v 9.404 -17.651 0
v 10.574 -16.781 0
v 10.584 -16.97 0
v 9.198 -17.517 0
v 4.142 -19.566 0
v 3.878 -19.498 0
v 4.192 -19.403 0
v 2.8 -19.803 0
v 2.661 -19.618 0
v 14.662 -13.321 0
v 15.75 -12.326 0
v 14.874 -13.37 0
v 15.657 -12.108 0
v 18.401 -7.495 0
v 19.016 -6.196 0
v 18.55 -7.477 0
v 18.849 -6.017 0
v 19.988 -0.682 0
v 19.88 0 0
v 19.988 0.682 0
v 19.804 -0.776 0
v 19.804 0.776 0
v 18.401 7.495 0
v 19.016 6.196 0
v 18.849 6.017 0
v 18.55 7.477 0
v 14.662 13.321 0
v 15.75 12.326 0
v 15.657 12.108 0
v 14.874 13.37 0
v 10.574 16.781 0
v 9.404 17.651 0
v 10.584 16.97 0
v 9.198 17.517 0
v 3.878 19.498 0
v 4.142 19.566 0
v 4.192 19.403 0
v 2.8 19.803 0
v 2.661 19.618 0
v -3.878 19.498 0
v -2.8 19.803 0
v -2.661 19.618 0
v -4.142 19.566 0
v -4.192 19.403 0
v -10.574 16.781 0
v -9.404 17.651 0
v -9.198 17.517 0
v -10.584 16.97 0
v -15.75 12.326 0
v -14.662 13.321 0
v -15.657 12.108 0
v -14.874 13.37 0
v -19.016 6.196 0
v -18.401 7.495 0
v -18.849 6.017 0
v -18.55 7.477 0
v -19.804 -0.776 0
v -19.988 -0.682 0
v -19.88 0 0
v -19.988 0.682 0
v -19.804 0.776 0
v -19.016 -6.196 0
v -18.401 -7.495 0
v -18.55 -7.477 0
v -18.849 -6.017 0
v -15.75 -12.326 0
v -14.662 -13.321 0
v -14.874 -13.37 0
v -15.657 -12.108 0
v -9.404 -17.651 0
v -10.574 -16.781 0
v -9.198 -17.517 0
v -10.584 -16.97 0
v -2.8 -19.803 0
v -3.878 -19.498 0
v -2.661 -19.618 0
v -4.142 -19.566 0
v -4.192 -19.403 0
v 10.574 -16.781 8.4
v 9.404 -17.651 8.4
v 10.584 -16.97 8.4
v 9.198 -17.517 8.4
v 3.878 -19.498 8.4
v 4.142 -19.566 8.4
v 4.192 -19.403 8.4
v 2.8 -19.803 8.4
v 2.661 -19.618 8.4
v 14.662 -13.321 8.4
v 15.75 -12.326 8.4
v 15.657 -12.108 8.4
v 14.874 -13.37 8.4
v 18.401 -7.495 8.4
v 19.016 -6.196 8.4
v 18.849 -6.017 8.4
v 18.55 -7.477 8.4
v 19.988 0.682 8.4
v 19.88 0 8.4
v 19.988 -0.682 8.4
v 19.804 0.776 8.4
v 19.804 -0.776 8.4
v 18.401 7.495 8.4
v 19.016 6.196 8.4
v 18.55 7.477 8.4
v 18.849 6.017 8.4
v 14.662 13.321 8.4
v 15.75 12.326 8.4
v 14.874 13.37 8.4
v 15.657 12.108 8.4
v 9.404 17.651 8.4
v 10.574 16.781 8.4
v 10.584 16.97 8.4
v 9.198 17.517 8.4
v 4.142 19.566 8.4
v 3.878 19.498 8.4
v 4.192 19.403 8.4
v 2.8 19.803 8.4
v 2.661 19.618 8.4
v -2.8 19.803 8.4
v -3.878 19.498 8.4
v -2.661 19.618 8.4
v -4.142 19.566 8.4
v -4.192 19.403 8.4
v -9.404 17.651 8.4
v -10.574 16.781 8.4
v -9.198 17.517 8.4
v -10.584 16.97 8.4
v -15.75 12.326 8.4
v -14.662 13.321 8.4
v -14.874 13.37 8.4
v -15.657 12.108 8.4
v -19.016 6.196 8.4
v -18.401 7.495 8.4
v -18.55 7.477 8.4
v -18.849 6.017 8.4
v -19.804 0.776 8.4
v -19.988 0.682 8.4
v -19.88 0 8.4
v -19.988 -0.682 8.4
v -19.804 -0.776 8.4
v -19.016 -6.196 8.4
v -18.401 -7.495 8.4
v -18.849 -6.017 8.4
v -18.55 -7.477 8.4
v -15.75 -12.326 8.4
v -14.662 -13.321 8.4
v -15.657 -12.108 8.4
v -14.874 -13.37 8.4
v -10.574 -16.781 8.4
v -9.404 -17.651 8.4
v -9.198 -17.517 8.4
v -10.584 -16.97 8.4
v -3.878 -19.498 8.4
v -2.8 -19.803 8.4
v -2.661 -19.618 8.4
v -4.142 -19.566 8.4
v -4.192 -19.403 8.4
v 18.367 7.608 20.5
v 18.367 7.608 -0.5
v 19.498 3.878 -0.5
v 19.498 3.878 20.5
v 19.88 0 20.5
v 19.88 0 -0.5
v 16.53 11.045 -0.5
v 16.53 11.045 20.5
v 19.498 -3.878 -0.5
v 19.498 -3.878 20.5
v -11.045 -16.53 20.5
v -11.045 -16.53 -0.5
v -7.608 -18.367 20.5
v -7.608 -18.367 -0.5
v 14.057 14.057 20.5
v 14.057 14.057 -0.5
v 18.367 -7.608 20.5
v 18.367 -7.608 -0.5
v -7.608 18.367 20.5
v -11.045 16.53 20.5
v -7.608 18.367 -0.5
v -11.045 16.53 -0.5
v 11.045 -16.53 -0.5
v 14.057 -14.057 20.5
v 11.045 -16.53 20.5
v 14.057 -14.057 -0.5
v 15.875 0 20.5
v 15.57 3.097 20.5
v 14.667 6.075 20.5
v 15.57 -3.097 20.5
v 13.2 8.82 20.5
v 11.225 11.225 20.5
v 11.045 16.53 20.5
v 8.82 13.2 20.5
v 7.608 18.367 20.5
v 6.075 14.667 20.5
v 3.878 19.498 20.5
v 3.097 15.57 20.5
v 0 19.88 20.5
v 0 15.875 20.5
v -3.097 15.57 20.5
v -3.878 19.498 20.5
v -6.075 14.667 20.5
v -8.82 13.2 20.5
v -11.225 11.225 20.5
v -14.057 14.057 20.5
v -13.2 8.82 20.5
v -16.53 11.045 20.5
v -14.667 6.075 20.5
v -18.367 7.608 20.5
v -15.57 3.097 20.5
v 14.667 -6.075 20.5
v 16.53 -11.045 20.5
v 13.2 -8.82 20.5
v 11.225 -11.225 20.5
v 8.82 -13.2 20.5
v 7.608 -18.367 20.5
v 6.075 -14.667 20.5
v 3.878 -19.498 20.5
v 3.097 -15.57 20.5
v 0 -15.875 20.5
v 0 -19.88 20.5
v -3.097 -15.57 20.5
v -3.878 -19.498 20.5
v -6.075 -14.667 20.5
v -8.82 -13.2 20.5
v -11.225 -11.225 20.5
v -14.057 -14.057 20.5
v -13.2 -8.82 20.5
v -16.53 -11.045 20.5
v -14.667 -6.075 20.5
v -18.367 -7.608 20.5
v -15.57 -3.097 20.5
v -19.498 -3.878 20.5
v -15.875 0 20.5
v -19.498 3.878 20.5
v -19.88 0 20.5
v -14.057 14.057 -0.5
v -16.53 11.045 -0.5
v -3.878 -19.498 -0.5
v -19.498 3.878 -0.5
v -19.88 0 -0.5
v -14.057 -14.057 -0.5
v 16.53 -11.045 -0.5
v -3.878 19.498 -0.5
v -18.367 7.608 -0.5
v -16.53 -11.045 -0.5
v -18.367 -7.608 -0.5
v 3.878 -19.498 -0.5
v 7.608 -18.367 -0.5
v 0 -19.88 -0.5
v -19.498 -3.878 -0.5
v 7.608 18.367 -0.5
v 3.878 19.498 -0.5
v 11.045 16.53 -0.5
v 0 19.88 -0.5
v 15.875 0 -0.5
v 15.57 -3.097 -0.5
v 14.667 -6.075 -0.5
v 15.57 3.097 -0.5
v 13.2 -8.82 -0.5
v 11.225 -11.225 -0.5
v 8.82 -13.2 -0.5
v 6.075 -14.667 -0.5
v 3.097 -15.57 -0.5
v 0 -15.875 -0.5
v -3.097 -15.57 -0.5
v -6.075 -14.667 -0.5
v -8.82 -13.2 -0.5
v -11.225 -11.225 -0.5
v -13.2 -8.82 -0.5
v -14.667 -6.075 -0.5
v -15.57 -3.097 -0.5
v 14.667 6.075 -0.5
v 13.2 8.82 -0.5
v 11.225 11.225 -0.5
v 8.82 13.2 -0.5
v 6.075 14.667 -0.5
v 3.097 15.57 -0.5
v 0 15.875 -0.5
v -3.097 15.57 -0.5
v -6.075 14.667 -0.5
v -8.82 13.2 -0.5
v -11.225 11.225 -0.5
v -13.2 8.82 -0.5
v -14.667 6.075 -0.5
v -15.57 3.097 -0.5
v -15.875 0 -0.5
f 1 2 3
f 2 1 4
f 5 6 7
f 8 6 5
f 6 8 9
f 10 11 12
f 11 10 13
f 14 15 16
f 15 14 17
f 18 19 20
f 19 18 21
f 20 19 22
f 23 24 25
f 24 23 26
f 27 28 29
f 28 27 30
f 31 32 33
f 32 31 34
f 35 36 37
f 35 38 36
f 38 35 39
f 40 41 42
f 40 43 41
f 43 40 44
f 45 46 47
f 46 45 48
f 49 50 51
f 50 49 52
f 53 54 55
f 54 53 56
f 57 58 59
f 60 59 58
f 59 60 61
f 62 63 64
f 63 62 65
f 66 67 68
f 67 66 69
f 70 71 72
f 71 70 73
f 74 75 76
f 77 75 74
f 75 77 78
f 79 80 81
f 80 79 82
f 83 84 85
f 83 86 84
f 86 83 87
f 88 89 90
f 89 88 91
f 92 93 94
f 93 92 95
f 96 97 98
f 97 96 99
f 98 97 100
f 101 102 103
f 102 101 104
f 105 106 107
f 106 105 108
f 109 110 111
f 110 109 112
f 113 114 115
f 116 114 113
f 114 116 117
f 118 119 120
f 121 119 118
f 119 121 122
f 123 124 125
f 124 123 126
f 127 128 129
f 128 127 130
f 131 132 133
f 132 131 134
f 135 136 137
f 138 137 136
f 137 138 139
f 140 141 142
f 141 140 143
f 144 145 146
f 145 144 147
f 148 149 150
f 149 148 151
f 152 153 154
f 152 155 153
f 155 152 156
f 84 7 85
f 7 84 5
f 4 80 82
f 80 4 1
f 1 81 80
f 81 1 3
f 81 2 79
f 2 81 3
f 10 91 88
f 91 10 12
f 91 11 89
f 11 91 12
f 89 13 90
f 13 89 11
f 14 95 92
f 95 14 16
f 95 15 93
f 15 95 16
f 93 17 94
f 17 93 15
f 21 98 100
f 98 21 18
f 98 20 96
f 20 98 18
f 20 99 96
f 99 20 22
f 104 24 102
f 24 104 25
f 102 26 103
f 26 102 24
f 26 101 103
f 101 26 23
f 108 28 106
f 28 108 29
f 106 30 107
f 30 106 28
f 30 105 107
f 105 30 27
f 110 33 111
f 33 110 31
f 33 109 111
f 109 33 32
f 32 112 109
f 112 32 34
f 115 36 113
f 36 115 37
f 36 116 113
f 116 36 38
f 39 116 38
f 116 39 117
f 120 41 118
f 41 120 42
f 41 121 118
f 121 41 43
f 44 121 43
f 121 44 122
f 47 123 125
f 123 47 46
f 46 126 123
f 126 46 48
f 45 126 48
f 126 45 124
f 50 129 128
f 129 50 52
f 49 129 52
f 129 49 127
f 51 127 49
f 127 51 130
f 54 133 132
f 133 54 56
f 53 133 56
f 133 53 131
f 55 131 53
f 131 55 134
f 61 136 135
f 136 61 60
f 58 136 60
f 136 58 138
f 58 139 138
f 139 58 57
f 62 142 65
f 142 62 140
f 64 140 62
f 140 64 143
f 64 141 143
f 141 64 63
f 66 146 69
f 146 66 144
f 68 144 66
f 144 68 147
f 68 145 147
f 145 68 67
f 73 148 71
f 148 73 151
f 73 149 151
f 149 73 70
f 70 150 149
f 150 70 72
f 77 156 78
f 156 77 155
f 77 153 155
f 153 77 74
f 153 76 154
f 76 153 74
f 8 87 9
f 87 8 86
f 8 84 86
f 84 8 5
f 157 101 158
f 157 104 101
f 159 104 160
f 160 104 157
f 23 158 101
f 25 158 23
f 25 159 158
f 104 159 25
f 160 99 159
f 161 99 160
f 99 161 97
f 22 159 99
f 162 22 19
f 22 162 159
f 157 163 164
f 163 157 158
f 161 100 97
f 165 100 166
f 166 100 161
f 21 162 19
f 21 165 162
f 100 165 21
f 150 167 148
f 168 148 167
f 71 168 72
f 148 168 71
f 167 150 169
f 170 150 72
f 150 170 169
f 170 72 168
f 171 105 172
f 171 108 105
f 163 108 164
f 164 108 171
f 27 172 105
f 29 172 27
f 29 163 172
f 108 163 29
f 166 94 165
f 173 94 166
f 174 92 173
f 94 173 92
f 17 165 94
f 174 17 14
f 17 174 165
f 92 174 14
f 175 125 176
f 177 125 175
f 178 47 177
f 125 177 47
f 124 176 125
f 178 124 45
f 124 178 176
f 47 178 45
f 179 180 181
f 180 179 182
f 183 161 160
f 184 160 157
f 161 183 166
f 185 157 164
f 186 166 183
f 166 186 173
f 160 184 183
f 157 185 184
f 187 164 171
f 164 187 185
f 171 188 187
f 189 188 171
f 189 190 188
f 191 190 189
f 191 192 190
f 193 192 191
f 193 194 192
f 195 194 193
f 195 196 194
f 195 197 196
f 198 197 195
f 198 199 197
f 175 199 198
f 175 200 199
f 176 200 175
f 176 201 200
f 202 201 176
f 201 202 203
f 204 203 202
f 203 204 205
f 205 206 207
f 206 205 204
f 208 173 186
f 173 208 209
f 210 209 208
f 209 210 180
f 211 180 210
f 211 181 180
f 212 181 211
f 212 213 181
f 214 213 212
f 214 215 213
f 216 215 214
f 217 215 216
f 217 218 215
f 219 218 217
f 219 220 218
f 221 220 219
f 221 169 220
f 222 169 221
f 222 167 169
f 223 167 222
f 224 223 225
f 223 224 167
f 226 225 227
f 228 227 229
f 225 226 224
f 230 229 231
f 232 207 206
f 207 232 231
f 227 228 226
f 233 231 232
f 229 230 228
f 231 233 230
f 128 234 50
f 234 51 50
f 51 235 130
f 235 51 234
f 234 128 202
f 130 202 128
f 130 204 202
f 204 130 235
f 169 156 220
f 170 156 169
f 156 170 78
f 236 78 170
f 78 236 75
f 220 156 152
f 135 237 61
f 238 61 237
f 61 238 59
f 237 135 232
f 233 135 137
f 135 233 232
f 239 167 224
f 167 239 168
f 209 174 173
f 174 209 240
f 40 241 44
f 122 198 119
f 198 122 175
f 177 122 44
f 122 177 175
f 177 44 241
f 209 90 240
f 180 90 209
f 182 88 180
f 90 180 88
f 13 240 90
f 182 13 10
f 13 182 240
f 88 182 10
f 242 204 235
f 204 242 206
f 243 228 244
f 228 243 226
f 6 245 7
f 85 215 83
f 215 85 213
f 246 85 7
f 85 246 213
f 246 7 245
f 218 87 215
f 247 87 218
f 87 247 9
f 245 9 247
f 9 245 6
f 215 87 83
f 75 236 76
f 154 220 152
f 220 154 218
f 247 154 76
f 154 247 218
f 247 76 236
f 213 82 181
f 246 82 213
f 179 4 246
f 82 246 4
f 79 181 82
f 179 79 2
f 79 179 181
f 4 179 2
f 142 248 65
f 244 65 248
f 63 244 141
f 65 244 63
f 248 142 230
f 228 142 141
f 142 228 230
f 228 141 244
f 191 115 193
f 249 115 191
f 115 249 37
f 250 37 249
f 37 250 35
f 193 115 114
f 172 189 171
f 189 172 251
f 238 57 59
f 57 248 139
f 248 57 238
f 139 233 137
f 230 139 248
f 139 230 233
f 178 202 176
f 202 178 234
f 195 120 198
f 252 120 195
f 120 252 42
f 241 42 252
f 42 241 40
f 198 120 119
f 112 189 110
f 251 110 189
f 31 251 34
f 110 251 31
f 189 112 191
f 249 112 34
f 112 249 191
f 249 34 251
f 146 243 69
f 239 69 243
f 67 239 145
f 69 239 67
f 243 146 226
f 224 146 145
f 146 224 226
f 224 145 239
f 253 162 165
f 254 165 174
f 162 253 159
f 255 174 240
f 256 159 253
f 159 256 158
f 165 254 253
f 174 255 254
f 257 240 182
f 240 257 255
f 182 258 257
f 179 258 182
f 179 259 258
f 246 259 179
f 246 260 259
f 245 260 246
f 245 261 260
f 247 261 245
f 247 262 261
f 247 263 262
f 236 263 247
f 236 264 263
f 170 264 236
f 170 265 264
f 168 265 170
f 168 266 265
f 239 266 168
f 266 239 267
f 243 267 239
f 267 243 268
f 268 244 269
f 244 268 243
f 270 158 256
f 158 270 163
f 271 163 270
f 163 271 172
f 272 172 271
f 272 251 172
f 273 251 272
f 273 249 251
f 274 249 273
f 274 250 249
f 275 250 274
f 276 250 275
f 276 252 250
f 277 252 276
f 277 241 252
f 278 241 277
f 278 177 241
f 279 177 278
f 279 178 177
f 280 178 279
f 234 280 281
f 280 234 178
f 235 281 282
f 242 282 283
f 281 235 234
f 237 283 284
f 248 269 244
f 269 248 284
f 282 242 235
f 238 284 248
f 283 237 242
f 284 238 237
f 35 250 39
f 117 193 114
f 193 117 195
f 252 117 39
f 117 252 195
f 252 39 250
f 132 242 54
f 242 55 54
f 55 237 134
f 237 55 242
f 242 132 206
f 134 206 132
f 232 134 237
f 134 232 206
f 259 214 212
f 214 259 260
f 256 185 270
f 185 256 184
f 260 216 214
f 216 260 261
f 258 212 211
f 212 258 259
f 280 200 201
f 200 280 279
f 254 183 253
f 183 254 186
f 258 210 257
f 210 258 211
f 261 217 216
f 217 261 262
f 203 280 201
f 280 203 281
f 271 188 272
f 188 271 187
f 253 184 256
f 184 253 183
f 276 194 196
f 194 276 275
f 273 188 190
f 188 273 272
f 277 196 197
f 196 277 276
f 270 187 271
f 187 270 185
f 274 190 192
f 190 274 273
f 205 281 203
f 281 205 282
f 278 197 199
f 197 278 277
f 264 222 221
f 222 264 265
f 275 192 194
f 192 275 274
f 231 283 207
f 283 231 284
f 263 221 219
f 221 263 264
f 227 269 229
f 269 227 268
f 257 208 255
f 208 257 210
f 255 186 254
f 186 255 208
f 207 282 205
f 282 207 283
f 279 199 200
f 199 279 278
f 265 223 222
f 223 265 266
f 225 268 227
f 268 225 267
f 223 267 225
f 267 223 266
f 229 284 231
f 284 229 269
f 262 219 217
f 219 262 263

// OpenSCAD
$fn = 32;

// ----------------------------------------------------------------------
// Two-module gear rim: z18 m2 and z18 m1.4, 20 mm wide
// ----------------------------------------------------------------------

// --- parameters (mm) ---
module_a = 2;             // first tooth module
teeth_a = 18;             // first band tooth count
module_b = 1.4;           // second tooth module
teeth_b = 18;             // second band tooth count
band_h = 8;               // height of one tooth band
web_t = 4;                // web thickness between the bands
total = 20;               // overall width over both bands
root_r = 15.5;            // root radius of the coarse band
hub_r = 19.88;            // hub radius
bore_d = 31.75;           // hub bore
hole_count = 6;           // lightening holes
hole_r = 10.75;           // lightening hole circle radius
hole_d = 4.28;            // lightening hole diameter

band_a = [[15.419, -1.579], [17.907, -1.575], [18.95, -1.21], [19.988, -0.682], [19.988, 0.682], [18.95, 1.21], [17.907, 1.575], [15.419, 1.579], [15.029, 3.79], [17.366, 4.644], [18.221, 5.344], [19.016, 6.196], [18.55, 7.477], [17.393, 7.618], [16.288, 7.605], [13.95, 6.757], [12.827, 8.702], [14.73, 10.304], [15.294, 11.254], [15.75, 12.326], [14.874, 13.37], [13.739, 13.107], [12.705, 12.717], [10.797, 11.121], [9.077, 12.564], [10.318, 14.72], [10.523, 15.806], [10.584, 16.97], [9.404, 17.651], [8.427, 17.016], [7.589, 16.296], [6.343, 14.143], [4.232, 14.911], [4.661, 17.362], [4.482, 18.452], [4.142, 19.566], [2.8, 19.803], [2.099, 18.872], [1.558, 17.909], [1.123, 15.459], [-1.123, 15.459], [-1.558, 17.909], [-2.099, 18.872], [-2.8, 19.803], [-4.142, 19.566], [-4.482, 18.452], [-4.661, 17.362], [-4.232, 14.911], [-6.343, 14.143], [-7.589, 16.296], [-8.427, 17.016], [-9.404, 17.651], [-10.584, 16.97], [-10.523, 15.806], [-10.318, 14.72], [-9.077, 12.564], [-10.797, 11.121], [-12.705, 12.717], [-13.739, 13.107], [-14.874, 13.37], [-15.75, 12.326], [-15.294, 11.254], [-14.73, 10.304], [-12.827, 8.702], [-13.95, 6.757], [-16.288, 7.605], [-17.393, 7.618], [-18.55, 7.477], [-19.016, 6.196], [-18.221, 5.344], [-17.366, 4.644], [-15.029, 3.79], [-15.419, 1.579], [-17.907, 1.575], [-18.95, 1.21], [-19.988, 0.682], [-19.988, -0.682], [-18.95, -1.21], [-17.907, -1.575], [-15.419, -1.579], [-15.029, -3.79], [-17.366, -4.644], [-18.221, -5.344], [-19.016, -6.196], [-18.55, -7.477], [-17.393, -7.618], [-16.288, -7.605], [-13.95, -6.757], [-12.827, -8.702], [-14.73, -10.304], [-15.294, -11.254], [-15.75, -12.326], [-14.874, -13.37], [-13.739, -13.107], [-12.705, -12.717], [-10.797, -11.121], [-9.077, -12.564], [-10.318, -14.72], [-10.523, -15.806], [-10.584, -16.97], [-9.404, -17.651], [-8.427, -17.016], [-7.589, -16.296], [-6.343, -14.143], [-4.232, -14.911], [-4.661, -17.362], [-4.482, -18.452], [-4.142, -19.566], [-2.8, -19.803], [-2.099, -18.872], [-1.558, -17.909], [-1.123, -15.459], [1.123, -15.459], [1.558, -17.909], [2.099, -18.872], [2.8, -19.803], [4.142, -19.566], [4.482, -18.452], [4.661, -17.362], [4.232, -14.911], [6.343, -14.143], [7.589, -16.296], [8.427, -17.016], [9.404, -17.651], [10.584, -16.97], [10.523, -15.806], [10.318, -14.72], [9.077, -12.564], [10.797, -11.121], [12.705, -12.717], [13.739, -13.107], [14.874, -13.37], [15.75, -12.326], [15.294, -11.254], [14.73, -10.304], [12.827, -8.702], [13.95, -6.757], [16.288, -7.605], [17.393, -7.618], [18.55, -7.477], [19.016, -6.196], [18.221, -5.344], [17.366, -4.644], [15.029, -3.79]];
band_b = [[10.794, -1.104], [12.545, -1.1], [13.27, -0.845], [13.992, -0.477], [13.992, 0.477], [13.27, 0.845], [12.545, 1.1], [10.794, 1.104], [10.52, 2.654], [12.165, 3.257], [12.758, 3.745], [13.311, 4.337], [12.985, 5.234], [12.181, 5.332], [11.413, 5.324], [9.765, 4.729], [8.978, 6.092], [10.317, 7.221], [10.708, 7.883], [11.025, 8.628], [10.412, 9.359], [9.622, 9.177], [8.903, 8.907], [7.559, 7.784], [6.353, 8.796], [7.225, 10.315], [7.366, 11.07], [7.409, 11.879], [6.583, 12.356], [5.903, 11.914], [5.32, 11.415], [4.441, 9.9], [2.961, 10.438], [3.262, 12.164], [3.136, 12.922], [2.899, 13.696], [1.96, 13.862], [1.472, 13.215], [1.095, 12.546], [0.787, 10.821], [-0.787, 10.821], [-1.095, 12.546], [-1.472, 13.215], [-1.96, 13.862], [-2.899, 13.696], [-3.136, 12.922], [-3.262, 12.164], [-2.961, 10.438], [-4.441, 9.9], [-5.32, 11.415], [-5.903, 11.914], [-6.583, 12.356], [-7.409, 11.879], [-7.366, 11.07], [-7.225, 10.315], [-6.353, 8.796], [-7.559, 7.784], [-8.903, 8.907], [-9.622, 9.177], [-10.412, 9.359], [-11.025, 8.628], [-10.708, 7.883], [-10.317, 7.221], [-8.978, 6.092], [-9.765, 4.729], [-11.413, 5.324], [-12.181, 5.332], [-12.985, 5.234], [-13.311, 4.337], [-12.758, 3.745], [-12.165, 3.257], [-10.52, 2.654], [-10.794, 1.104], [-12.545, 1.1], [-13.27, 0.845], [-13.992, 0.477], [-13.992, -0.477], [-13.27, -0.845], [-12.545, -1.1], [-10.794, -1.104], [-10.52, -2.654], [-12.165, -3.257], [-12.758, -3.745], [-13.311, -4.337], [-12.985, -5.234], [-12.181, -5.332], [-11.413, -5.324], [-9.765, -4.729], [-8.978, -6.092], [-10.317, -7.221], [-10.708, -7.883], [-11.025, -8.628], [-10.412, -9.359], [-9.622, -9.177], [-8.903, -8.907], [-7.559, -7.784], [-6.353, -8.796], [-7.225, -10.315], [-7.366, -11.07], [-7.409, -11.879], [-6.583, -12.356], [-5.903, -11.914], [-5.32, -11.415], [-4.441, -9.9], [-2.961, -10.438], [-3.262, -12.164], [-3.136, -12.922], [-2.899, -13.696], [-1.96, -13.862], [-1.472, -13.215], [-1.095, -12.546], [-0.787, -10.821], [0.787, -10.821], [1.095, -12.546], [1.472, -13.215], [1.96, -13.862], [2.899, -13.696], [3.136, -12.922], [3.262, -12.164], [2.961, -10.438], [4.441, -9.9], [5.32, -11.415], [5.903, -11.914], [6.583, -12.356], [7.409, -11.879], [7.366, -11.07], [7.225, -10.315], [6.353, -8.796], [7.559, -7.784], [8.903, -8.907], [9.622, -9.177], [10.412, -9.359], [11.025, -8.628], [10.708, -7.883], [10.317, -7.221], [8.978, -6.092], [9.765, -4.729], [11.413, -5.324], [12.181, -5.332], [12.985, -5.234], [13.311, -4.337], [12.758, -3.745], [12.165, -3.257], [10.52, -2.654]];

difference() {
  union() {
    /* tooth band A, overlapping the web by 0.4 mm */
    linear_extrude(height = band_h + 0.4) polygon(band_a);
    /* web */
    translate([0, 0, band_h - 0.4]) cylinder(h = web_t + 0.8, d = 2 * root_r);
    /* tooth band B */
    translate([0, 0, band_h + web_t]) linear_extrude(height = band_h + 0.4) polygon(band_b);
    /* hub */
    translate([0, 0, -0.5]) cylinder(h = total + 1.0, d = 2 * hub_r);
  }
  /* bore */
  translate([0, 0, -2.5]) cylinder(h = total + 5, d = bore_d);
  /* lightening holes through the web */
  for (i = [0 : hole_count - 1]) {
    a = i * 360 / hole_count;
    translate([hole_r * cos(a), hole_r * sin(a), -2.5]) cylinder(h = total + 5, d = hole_d);
  }
}
